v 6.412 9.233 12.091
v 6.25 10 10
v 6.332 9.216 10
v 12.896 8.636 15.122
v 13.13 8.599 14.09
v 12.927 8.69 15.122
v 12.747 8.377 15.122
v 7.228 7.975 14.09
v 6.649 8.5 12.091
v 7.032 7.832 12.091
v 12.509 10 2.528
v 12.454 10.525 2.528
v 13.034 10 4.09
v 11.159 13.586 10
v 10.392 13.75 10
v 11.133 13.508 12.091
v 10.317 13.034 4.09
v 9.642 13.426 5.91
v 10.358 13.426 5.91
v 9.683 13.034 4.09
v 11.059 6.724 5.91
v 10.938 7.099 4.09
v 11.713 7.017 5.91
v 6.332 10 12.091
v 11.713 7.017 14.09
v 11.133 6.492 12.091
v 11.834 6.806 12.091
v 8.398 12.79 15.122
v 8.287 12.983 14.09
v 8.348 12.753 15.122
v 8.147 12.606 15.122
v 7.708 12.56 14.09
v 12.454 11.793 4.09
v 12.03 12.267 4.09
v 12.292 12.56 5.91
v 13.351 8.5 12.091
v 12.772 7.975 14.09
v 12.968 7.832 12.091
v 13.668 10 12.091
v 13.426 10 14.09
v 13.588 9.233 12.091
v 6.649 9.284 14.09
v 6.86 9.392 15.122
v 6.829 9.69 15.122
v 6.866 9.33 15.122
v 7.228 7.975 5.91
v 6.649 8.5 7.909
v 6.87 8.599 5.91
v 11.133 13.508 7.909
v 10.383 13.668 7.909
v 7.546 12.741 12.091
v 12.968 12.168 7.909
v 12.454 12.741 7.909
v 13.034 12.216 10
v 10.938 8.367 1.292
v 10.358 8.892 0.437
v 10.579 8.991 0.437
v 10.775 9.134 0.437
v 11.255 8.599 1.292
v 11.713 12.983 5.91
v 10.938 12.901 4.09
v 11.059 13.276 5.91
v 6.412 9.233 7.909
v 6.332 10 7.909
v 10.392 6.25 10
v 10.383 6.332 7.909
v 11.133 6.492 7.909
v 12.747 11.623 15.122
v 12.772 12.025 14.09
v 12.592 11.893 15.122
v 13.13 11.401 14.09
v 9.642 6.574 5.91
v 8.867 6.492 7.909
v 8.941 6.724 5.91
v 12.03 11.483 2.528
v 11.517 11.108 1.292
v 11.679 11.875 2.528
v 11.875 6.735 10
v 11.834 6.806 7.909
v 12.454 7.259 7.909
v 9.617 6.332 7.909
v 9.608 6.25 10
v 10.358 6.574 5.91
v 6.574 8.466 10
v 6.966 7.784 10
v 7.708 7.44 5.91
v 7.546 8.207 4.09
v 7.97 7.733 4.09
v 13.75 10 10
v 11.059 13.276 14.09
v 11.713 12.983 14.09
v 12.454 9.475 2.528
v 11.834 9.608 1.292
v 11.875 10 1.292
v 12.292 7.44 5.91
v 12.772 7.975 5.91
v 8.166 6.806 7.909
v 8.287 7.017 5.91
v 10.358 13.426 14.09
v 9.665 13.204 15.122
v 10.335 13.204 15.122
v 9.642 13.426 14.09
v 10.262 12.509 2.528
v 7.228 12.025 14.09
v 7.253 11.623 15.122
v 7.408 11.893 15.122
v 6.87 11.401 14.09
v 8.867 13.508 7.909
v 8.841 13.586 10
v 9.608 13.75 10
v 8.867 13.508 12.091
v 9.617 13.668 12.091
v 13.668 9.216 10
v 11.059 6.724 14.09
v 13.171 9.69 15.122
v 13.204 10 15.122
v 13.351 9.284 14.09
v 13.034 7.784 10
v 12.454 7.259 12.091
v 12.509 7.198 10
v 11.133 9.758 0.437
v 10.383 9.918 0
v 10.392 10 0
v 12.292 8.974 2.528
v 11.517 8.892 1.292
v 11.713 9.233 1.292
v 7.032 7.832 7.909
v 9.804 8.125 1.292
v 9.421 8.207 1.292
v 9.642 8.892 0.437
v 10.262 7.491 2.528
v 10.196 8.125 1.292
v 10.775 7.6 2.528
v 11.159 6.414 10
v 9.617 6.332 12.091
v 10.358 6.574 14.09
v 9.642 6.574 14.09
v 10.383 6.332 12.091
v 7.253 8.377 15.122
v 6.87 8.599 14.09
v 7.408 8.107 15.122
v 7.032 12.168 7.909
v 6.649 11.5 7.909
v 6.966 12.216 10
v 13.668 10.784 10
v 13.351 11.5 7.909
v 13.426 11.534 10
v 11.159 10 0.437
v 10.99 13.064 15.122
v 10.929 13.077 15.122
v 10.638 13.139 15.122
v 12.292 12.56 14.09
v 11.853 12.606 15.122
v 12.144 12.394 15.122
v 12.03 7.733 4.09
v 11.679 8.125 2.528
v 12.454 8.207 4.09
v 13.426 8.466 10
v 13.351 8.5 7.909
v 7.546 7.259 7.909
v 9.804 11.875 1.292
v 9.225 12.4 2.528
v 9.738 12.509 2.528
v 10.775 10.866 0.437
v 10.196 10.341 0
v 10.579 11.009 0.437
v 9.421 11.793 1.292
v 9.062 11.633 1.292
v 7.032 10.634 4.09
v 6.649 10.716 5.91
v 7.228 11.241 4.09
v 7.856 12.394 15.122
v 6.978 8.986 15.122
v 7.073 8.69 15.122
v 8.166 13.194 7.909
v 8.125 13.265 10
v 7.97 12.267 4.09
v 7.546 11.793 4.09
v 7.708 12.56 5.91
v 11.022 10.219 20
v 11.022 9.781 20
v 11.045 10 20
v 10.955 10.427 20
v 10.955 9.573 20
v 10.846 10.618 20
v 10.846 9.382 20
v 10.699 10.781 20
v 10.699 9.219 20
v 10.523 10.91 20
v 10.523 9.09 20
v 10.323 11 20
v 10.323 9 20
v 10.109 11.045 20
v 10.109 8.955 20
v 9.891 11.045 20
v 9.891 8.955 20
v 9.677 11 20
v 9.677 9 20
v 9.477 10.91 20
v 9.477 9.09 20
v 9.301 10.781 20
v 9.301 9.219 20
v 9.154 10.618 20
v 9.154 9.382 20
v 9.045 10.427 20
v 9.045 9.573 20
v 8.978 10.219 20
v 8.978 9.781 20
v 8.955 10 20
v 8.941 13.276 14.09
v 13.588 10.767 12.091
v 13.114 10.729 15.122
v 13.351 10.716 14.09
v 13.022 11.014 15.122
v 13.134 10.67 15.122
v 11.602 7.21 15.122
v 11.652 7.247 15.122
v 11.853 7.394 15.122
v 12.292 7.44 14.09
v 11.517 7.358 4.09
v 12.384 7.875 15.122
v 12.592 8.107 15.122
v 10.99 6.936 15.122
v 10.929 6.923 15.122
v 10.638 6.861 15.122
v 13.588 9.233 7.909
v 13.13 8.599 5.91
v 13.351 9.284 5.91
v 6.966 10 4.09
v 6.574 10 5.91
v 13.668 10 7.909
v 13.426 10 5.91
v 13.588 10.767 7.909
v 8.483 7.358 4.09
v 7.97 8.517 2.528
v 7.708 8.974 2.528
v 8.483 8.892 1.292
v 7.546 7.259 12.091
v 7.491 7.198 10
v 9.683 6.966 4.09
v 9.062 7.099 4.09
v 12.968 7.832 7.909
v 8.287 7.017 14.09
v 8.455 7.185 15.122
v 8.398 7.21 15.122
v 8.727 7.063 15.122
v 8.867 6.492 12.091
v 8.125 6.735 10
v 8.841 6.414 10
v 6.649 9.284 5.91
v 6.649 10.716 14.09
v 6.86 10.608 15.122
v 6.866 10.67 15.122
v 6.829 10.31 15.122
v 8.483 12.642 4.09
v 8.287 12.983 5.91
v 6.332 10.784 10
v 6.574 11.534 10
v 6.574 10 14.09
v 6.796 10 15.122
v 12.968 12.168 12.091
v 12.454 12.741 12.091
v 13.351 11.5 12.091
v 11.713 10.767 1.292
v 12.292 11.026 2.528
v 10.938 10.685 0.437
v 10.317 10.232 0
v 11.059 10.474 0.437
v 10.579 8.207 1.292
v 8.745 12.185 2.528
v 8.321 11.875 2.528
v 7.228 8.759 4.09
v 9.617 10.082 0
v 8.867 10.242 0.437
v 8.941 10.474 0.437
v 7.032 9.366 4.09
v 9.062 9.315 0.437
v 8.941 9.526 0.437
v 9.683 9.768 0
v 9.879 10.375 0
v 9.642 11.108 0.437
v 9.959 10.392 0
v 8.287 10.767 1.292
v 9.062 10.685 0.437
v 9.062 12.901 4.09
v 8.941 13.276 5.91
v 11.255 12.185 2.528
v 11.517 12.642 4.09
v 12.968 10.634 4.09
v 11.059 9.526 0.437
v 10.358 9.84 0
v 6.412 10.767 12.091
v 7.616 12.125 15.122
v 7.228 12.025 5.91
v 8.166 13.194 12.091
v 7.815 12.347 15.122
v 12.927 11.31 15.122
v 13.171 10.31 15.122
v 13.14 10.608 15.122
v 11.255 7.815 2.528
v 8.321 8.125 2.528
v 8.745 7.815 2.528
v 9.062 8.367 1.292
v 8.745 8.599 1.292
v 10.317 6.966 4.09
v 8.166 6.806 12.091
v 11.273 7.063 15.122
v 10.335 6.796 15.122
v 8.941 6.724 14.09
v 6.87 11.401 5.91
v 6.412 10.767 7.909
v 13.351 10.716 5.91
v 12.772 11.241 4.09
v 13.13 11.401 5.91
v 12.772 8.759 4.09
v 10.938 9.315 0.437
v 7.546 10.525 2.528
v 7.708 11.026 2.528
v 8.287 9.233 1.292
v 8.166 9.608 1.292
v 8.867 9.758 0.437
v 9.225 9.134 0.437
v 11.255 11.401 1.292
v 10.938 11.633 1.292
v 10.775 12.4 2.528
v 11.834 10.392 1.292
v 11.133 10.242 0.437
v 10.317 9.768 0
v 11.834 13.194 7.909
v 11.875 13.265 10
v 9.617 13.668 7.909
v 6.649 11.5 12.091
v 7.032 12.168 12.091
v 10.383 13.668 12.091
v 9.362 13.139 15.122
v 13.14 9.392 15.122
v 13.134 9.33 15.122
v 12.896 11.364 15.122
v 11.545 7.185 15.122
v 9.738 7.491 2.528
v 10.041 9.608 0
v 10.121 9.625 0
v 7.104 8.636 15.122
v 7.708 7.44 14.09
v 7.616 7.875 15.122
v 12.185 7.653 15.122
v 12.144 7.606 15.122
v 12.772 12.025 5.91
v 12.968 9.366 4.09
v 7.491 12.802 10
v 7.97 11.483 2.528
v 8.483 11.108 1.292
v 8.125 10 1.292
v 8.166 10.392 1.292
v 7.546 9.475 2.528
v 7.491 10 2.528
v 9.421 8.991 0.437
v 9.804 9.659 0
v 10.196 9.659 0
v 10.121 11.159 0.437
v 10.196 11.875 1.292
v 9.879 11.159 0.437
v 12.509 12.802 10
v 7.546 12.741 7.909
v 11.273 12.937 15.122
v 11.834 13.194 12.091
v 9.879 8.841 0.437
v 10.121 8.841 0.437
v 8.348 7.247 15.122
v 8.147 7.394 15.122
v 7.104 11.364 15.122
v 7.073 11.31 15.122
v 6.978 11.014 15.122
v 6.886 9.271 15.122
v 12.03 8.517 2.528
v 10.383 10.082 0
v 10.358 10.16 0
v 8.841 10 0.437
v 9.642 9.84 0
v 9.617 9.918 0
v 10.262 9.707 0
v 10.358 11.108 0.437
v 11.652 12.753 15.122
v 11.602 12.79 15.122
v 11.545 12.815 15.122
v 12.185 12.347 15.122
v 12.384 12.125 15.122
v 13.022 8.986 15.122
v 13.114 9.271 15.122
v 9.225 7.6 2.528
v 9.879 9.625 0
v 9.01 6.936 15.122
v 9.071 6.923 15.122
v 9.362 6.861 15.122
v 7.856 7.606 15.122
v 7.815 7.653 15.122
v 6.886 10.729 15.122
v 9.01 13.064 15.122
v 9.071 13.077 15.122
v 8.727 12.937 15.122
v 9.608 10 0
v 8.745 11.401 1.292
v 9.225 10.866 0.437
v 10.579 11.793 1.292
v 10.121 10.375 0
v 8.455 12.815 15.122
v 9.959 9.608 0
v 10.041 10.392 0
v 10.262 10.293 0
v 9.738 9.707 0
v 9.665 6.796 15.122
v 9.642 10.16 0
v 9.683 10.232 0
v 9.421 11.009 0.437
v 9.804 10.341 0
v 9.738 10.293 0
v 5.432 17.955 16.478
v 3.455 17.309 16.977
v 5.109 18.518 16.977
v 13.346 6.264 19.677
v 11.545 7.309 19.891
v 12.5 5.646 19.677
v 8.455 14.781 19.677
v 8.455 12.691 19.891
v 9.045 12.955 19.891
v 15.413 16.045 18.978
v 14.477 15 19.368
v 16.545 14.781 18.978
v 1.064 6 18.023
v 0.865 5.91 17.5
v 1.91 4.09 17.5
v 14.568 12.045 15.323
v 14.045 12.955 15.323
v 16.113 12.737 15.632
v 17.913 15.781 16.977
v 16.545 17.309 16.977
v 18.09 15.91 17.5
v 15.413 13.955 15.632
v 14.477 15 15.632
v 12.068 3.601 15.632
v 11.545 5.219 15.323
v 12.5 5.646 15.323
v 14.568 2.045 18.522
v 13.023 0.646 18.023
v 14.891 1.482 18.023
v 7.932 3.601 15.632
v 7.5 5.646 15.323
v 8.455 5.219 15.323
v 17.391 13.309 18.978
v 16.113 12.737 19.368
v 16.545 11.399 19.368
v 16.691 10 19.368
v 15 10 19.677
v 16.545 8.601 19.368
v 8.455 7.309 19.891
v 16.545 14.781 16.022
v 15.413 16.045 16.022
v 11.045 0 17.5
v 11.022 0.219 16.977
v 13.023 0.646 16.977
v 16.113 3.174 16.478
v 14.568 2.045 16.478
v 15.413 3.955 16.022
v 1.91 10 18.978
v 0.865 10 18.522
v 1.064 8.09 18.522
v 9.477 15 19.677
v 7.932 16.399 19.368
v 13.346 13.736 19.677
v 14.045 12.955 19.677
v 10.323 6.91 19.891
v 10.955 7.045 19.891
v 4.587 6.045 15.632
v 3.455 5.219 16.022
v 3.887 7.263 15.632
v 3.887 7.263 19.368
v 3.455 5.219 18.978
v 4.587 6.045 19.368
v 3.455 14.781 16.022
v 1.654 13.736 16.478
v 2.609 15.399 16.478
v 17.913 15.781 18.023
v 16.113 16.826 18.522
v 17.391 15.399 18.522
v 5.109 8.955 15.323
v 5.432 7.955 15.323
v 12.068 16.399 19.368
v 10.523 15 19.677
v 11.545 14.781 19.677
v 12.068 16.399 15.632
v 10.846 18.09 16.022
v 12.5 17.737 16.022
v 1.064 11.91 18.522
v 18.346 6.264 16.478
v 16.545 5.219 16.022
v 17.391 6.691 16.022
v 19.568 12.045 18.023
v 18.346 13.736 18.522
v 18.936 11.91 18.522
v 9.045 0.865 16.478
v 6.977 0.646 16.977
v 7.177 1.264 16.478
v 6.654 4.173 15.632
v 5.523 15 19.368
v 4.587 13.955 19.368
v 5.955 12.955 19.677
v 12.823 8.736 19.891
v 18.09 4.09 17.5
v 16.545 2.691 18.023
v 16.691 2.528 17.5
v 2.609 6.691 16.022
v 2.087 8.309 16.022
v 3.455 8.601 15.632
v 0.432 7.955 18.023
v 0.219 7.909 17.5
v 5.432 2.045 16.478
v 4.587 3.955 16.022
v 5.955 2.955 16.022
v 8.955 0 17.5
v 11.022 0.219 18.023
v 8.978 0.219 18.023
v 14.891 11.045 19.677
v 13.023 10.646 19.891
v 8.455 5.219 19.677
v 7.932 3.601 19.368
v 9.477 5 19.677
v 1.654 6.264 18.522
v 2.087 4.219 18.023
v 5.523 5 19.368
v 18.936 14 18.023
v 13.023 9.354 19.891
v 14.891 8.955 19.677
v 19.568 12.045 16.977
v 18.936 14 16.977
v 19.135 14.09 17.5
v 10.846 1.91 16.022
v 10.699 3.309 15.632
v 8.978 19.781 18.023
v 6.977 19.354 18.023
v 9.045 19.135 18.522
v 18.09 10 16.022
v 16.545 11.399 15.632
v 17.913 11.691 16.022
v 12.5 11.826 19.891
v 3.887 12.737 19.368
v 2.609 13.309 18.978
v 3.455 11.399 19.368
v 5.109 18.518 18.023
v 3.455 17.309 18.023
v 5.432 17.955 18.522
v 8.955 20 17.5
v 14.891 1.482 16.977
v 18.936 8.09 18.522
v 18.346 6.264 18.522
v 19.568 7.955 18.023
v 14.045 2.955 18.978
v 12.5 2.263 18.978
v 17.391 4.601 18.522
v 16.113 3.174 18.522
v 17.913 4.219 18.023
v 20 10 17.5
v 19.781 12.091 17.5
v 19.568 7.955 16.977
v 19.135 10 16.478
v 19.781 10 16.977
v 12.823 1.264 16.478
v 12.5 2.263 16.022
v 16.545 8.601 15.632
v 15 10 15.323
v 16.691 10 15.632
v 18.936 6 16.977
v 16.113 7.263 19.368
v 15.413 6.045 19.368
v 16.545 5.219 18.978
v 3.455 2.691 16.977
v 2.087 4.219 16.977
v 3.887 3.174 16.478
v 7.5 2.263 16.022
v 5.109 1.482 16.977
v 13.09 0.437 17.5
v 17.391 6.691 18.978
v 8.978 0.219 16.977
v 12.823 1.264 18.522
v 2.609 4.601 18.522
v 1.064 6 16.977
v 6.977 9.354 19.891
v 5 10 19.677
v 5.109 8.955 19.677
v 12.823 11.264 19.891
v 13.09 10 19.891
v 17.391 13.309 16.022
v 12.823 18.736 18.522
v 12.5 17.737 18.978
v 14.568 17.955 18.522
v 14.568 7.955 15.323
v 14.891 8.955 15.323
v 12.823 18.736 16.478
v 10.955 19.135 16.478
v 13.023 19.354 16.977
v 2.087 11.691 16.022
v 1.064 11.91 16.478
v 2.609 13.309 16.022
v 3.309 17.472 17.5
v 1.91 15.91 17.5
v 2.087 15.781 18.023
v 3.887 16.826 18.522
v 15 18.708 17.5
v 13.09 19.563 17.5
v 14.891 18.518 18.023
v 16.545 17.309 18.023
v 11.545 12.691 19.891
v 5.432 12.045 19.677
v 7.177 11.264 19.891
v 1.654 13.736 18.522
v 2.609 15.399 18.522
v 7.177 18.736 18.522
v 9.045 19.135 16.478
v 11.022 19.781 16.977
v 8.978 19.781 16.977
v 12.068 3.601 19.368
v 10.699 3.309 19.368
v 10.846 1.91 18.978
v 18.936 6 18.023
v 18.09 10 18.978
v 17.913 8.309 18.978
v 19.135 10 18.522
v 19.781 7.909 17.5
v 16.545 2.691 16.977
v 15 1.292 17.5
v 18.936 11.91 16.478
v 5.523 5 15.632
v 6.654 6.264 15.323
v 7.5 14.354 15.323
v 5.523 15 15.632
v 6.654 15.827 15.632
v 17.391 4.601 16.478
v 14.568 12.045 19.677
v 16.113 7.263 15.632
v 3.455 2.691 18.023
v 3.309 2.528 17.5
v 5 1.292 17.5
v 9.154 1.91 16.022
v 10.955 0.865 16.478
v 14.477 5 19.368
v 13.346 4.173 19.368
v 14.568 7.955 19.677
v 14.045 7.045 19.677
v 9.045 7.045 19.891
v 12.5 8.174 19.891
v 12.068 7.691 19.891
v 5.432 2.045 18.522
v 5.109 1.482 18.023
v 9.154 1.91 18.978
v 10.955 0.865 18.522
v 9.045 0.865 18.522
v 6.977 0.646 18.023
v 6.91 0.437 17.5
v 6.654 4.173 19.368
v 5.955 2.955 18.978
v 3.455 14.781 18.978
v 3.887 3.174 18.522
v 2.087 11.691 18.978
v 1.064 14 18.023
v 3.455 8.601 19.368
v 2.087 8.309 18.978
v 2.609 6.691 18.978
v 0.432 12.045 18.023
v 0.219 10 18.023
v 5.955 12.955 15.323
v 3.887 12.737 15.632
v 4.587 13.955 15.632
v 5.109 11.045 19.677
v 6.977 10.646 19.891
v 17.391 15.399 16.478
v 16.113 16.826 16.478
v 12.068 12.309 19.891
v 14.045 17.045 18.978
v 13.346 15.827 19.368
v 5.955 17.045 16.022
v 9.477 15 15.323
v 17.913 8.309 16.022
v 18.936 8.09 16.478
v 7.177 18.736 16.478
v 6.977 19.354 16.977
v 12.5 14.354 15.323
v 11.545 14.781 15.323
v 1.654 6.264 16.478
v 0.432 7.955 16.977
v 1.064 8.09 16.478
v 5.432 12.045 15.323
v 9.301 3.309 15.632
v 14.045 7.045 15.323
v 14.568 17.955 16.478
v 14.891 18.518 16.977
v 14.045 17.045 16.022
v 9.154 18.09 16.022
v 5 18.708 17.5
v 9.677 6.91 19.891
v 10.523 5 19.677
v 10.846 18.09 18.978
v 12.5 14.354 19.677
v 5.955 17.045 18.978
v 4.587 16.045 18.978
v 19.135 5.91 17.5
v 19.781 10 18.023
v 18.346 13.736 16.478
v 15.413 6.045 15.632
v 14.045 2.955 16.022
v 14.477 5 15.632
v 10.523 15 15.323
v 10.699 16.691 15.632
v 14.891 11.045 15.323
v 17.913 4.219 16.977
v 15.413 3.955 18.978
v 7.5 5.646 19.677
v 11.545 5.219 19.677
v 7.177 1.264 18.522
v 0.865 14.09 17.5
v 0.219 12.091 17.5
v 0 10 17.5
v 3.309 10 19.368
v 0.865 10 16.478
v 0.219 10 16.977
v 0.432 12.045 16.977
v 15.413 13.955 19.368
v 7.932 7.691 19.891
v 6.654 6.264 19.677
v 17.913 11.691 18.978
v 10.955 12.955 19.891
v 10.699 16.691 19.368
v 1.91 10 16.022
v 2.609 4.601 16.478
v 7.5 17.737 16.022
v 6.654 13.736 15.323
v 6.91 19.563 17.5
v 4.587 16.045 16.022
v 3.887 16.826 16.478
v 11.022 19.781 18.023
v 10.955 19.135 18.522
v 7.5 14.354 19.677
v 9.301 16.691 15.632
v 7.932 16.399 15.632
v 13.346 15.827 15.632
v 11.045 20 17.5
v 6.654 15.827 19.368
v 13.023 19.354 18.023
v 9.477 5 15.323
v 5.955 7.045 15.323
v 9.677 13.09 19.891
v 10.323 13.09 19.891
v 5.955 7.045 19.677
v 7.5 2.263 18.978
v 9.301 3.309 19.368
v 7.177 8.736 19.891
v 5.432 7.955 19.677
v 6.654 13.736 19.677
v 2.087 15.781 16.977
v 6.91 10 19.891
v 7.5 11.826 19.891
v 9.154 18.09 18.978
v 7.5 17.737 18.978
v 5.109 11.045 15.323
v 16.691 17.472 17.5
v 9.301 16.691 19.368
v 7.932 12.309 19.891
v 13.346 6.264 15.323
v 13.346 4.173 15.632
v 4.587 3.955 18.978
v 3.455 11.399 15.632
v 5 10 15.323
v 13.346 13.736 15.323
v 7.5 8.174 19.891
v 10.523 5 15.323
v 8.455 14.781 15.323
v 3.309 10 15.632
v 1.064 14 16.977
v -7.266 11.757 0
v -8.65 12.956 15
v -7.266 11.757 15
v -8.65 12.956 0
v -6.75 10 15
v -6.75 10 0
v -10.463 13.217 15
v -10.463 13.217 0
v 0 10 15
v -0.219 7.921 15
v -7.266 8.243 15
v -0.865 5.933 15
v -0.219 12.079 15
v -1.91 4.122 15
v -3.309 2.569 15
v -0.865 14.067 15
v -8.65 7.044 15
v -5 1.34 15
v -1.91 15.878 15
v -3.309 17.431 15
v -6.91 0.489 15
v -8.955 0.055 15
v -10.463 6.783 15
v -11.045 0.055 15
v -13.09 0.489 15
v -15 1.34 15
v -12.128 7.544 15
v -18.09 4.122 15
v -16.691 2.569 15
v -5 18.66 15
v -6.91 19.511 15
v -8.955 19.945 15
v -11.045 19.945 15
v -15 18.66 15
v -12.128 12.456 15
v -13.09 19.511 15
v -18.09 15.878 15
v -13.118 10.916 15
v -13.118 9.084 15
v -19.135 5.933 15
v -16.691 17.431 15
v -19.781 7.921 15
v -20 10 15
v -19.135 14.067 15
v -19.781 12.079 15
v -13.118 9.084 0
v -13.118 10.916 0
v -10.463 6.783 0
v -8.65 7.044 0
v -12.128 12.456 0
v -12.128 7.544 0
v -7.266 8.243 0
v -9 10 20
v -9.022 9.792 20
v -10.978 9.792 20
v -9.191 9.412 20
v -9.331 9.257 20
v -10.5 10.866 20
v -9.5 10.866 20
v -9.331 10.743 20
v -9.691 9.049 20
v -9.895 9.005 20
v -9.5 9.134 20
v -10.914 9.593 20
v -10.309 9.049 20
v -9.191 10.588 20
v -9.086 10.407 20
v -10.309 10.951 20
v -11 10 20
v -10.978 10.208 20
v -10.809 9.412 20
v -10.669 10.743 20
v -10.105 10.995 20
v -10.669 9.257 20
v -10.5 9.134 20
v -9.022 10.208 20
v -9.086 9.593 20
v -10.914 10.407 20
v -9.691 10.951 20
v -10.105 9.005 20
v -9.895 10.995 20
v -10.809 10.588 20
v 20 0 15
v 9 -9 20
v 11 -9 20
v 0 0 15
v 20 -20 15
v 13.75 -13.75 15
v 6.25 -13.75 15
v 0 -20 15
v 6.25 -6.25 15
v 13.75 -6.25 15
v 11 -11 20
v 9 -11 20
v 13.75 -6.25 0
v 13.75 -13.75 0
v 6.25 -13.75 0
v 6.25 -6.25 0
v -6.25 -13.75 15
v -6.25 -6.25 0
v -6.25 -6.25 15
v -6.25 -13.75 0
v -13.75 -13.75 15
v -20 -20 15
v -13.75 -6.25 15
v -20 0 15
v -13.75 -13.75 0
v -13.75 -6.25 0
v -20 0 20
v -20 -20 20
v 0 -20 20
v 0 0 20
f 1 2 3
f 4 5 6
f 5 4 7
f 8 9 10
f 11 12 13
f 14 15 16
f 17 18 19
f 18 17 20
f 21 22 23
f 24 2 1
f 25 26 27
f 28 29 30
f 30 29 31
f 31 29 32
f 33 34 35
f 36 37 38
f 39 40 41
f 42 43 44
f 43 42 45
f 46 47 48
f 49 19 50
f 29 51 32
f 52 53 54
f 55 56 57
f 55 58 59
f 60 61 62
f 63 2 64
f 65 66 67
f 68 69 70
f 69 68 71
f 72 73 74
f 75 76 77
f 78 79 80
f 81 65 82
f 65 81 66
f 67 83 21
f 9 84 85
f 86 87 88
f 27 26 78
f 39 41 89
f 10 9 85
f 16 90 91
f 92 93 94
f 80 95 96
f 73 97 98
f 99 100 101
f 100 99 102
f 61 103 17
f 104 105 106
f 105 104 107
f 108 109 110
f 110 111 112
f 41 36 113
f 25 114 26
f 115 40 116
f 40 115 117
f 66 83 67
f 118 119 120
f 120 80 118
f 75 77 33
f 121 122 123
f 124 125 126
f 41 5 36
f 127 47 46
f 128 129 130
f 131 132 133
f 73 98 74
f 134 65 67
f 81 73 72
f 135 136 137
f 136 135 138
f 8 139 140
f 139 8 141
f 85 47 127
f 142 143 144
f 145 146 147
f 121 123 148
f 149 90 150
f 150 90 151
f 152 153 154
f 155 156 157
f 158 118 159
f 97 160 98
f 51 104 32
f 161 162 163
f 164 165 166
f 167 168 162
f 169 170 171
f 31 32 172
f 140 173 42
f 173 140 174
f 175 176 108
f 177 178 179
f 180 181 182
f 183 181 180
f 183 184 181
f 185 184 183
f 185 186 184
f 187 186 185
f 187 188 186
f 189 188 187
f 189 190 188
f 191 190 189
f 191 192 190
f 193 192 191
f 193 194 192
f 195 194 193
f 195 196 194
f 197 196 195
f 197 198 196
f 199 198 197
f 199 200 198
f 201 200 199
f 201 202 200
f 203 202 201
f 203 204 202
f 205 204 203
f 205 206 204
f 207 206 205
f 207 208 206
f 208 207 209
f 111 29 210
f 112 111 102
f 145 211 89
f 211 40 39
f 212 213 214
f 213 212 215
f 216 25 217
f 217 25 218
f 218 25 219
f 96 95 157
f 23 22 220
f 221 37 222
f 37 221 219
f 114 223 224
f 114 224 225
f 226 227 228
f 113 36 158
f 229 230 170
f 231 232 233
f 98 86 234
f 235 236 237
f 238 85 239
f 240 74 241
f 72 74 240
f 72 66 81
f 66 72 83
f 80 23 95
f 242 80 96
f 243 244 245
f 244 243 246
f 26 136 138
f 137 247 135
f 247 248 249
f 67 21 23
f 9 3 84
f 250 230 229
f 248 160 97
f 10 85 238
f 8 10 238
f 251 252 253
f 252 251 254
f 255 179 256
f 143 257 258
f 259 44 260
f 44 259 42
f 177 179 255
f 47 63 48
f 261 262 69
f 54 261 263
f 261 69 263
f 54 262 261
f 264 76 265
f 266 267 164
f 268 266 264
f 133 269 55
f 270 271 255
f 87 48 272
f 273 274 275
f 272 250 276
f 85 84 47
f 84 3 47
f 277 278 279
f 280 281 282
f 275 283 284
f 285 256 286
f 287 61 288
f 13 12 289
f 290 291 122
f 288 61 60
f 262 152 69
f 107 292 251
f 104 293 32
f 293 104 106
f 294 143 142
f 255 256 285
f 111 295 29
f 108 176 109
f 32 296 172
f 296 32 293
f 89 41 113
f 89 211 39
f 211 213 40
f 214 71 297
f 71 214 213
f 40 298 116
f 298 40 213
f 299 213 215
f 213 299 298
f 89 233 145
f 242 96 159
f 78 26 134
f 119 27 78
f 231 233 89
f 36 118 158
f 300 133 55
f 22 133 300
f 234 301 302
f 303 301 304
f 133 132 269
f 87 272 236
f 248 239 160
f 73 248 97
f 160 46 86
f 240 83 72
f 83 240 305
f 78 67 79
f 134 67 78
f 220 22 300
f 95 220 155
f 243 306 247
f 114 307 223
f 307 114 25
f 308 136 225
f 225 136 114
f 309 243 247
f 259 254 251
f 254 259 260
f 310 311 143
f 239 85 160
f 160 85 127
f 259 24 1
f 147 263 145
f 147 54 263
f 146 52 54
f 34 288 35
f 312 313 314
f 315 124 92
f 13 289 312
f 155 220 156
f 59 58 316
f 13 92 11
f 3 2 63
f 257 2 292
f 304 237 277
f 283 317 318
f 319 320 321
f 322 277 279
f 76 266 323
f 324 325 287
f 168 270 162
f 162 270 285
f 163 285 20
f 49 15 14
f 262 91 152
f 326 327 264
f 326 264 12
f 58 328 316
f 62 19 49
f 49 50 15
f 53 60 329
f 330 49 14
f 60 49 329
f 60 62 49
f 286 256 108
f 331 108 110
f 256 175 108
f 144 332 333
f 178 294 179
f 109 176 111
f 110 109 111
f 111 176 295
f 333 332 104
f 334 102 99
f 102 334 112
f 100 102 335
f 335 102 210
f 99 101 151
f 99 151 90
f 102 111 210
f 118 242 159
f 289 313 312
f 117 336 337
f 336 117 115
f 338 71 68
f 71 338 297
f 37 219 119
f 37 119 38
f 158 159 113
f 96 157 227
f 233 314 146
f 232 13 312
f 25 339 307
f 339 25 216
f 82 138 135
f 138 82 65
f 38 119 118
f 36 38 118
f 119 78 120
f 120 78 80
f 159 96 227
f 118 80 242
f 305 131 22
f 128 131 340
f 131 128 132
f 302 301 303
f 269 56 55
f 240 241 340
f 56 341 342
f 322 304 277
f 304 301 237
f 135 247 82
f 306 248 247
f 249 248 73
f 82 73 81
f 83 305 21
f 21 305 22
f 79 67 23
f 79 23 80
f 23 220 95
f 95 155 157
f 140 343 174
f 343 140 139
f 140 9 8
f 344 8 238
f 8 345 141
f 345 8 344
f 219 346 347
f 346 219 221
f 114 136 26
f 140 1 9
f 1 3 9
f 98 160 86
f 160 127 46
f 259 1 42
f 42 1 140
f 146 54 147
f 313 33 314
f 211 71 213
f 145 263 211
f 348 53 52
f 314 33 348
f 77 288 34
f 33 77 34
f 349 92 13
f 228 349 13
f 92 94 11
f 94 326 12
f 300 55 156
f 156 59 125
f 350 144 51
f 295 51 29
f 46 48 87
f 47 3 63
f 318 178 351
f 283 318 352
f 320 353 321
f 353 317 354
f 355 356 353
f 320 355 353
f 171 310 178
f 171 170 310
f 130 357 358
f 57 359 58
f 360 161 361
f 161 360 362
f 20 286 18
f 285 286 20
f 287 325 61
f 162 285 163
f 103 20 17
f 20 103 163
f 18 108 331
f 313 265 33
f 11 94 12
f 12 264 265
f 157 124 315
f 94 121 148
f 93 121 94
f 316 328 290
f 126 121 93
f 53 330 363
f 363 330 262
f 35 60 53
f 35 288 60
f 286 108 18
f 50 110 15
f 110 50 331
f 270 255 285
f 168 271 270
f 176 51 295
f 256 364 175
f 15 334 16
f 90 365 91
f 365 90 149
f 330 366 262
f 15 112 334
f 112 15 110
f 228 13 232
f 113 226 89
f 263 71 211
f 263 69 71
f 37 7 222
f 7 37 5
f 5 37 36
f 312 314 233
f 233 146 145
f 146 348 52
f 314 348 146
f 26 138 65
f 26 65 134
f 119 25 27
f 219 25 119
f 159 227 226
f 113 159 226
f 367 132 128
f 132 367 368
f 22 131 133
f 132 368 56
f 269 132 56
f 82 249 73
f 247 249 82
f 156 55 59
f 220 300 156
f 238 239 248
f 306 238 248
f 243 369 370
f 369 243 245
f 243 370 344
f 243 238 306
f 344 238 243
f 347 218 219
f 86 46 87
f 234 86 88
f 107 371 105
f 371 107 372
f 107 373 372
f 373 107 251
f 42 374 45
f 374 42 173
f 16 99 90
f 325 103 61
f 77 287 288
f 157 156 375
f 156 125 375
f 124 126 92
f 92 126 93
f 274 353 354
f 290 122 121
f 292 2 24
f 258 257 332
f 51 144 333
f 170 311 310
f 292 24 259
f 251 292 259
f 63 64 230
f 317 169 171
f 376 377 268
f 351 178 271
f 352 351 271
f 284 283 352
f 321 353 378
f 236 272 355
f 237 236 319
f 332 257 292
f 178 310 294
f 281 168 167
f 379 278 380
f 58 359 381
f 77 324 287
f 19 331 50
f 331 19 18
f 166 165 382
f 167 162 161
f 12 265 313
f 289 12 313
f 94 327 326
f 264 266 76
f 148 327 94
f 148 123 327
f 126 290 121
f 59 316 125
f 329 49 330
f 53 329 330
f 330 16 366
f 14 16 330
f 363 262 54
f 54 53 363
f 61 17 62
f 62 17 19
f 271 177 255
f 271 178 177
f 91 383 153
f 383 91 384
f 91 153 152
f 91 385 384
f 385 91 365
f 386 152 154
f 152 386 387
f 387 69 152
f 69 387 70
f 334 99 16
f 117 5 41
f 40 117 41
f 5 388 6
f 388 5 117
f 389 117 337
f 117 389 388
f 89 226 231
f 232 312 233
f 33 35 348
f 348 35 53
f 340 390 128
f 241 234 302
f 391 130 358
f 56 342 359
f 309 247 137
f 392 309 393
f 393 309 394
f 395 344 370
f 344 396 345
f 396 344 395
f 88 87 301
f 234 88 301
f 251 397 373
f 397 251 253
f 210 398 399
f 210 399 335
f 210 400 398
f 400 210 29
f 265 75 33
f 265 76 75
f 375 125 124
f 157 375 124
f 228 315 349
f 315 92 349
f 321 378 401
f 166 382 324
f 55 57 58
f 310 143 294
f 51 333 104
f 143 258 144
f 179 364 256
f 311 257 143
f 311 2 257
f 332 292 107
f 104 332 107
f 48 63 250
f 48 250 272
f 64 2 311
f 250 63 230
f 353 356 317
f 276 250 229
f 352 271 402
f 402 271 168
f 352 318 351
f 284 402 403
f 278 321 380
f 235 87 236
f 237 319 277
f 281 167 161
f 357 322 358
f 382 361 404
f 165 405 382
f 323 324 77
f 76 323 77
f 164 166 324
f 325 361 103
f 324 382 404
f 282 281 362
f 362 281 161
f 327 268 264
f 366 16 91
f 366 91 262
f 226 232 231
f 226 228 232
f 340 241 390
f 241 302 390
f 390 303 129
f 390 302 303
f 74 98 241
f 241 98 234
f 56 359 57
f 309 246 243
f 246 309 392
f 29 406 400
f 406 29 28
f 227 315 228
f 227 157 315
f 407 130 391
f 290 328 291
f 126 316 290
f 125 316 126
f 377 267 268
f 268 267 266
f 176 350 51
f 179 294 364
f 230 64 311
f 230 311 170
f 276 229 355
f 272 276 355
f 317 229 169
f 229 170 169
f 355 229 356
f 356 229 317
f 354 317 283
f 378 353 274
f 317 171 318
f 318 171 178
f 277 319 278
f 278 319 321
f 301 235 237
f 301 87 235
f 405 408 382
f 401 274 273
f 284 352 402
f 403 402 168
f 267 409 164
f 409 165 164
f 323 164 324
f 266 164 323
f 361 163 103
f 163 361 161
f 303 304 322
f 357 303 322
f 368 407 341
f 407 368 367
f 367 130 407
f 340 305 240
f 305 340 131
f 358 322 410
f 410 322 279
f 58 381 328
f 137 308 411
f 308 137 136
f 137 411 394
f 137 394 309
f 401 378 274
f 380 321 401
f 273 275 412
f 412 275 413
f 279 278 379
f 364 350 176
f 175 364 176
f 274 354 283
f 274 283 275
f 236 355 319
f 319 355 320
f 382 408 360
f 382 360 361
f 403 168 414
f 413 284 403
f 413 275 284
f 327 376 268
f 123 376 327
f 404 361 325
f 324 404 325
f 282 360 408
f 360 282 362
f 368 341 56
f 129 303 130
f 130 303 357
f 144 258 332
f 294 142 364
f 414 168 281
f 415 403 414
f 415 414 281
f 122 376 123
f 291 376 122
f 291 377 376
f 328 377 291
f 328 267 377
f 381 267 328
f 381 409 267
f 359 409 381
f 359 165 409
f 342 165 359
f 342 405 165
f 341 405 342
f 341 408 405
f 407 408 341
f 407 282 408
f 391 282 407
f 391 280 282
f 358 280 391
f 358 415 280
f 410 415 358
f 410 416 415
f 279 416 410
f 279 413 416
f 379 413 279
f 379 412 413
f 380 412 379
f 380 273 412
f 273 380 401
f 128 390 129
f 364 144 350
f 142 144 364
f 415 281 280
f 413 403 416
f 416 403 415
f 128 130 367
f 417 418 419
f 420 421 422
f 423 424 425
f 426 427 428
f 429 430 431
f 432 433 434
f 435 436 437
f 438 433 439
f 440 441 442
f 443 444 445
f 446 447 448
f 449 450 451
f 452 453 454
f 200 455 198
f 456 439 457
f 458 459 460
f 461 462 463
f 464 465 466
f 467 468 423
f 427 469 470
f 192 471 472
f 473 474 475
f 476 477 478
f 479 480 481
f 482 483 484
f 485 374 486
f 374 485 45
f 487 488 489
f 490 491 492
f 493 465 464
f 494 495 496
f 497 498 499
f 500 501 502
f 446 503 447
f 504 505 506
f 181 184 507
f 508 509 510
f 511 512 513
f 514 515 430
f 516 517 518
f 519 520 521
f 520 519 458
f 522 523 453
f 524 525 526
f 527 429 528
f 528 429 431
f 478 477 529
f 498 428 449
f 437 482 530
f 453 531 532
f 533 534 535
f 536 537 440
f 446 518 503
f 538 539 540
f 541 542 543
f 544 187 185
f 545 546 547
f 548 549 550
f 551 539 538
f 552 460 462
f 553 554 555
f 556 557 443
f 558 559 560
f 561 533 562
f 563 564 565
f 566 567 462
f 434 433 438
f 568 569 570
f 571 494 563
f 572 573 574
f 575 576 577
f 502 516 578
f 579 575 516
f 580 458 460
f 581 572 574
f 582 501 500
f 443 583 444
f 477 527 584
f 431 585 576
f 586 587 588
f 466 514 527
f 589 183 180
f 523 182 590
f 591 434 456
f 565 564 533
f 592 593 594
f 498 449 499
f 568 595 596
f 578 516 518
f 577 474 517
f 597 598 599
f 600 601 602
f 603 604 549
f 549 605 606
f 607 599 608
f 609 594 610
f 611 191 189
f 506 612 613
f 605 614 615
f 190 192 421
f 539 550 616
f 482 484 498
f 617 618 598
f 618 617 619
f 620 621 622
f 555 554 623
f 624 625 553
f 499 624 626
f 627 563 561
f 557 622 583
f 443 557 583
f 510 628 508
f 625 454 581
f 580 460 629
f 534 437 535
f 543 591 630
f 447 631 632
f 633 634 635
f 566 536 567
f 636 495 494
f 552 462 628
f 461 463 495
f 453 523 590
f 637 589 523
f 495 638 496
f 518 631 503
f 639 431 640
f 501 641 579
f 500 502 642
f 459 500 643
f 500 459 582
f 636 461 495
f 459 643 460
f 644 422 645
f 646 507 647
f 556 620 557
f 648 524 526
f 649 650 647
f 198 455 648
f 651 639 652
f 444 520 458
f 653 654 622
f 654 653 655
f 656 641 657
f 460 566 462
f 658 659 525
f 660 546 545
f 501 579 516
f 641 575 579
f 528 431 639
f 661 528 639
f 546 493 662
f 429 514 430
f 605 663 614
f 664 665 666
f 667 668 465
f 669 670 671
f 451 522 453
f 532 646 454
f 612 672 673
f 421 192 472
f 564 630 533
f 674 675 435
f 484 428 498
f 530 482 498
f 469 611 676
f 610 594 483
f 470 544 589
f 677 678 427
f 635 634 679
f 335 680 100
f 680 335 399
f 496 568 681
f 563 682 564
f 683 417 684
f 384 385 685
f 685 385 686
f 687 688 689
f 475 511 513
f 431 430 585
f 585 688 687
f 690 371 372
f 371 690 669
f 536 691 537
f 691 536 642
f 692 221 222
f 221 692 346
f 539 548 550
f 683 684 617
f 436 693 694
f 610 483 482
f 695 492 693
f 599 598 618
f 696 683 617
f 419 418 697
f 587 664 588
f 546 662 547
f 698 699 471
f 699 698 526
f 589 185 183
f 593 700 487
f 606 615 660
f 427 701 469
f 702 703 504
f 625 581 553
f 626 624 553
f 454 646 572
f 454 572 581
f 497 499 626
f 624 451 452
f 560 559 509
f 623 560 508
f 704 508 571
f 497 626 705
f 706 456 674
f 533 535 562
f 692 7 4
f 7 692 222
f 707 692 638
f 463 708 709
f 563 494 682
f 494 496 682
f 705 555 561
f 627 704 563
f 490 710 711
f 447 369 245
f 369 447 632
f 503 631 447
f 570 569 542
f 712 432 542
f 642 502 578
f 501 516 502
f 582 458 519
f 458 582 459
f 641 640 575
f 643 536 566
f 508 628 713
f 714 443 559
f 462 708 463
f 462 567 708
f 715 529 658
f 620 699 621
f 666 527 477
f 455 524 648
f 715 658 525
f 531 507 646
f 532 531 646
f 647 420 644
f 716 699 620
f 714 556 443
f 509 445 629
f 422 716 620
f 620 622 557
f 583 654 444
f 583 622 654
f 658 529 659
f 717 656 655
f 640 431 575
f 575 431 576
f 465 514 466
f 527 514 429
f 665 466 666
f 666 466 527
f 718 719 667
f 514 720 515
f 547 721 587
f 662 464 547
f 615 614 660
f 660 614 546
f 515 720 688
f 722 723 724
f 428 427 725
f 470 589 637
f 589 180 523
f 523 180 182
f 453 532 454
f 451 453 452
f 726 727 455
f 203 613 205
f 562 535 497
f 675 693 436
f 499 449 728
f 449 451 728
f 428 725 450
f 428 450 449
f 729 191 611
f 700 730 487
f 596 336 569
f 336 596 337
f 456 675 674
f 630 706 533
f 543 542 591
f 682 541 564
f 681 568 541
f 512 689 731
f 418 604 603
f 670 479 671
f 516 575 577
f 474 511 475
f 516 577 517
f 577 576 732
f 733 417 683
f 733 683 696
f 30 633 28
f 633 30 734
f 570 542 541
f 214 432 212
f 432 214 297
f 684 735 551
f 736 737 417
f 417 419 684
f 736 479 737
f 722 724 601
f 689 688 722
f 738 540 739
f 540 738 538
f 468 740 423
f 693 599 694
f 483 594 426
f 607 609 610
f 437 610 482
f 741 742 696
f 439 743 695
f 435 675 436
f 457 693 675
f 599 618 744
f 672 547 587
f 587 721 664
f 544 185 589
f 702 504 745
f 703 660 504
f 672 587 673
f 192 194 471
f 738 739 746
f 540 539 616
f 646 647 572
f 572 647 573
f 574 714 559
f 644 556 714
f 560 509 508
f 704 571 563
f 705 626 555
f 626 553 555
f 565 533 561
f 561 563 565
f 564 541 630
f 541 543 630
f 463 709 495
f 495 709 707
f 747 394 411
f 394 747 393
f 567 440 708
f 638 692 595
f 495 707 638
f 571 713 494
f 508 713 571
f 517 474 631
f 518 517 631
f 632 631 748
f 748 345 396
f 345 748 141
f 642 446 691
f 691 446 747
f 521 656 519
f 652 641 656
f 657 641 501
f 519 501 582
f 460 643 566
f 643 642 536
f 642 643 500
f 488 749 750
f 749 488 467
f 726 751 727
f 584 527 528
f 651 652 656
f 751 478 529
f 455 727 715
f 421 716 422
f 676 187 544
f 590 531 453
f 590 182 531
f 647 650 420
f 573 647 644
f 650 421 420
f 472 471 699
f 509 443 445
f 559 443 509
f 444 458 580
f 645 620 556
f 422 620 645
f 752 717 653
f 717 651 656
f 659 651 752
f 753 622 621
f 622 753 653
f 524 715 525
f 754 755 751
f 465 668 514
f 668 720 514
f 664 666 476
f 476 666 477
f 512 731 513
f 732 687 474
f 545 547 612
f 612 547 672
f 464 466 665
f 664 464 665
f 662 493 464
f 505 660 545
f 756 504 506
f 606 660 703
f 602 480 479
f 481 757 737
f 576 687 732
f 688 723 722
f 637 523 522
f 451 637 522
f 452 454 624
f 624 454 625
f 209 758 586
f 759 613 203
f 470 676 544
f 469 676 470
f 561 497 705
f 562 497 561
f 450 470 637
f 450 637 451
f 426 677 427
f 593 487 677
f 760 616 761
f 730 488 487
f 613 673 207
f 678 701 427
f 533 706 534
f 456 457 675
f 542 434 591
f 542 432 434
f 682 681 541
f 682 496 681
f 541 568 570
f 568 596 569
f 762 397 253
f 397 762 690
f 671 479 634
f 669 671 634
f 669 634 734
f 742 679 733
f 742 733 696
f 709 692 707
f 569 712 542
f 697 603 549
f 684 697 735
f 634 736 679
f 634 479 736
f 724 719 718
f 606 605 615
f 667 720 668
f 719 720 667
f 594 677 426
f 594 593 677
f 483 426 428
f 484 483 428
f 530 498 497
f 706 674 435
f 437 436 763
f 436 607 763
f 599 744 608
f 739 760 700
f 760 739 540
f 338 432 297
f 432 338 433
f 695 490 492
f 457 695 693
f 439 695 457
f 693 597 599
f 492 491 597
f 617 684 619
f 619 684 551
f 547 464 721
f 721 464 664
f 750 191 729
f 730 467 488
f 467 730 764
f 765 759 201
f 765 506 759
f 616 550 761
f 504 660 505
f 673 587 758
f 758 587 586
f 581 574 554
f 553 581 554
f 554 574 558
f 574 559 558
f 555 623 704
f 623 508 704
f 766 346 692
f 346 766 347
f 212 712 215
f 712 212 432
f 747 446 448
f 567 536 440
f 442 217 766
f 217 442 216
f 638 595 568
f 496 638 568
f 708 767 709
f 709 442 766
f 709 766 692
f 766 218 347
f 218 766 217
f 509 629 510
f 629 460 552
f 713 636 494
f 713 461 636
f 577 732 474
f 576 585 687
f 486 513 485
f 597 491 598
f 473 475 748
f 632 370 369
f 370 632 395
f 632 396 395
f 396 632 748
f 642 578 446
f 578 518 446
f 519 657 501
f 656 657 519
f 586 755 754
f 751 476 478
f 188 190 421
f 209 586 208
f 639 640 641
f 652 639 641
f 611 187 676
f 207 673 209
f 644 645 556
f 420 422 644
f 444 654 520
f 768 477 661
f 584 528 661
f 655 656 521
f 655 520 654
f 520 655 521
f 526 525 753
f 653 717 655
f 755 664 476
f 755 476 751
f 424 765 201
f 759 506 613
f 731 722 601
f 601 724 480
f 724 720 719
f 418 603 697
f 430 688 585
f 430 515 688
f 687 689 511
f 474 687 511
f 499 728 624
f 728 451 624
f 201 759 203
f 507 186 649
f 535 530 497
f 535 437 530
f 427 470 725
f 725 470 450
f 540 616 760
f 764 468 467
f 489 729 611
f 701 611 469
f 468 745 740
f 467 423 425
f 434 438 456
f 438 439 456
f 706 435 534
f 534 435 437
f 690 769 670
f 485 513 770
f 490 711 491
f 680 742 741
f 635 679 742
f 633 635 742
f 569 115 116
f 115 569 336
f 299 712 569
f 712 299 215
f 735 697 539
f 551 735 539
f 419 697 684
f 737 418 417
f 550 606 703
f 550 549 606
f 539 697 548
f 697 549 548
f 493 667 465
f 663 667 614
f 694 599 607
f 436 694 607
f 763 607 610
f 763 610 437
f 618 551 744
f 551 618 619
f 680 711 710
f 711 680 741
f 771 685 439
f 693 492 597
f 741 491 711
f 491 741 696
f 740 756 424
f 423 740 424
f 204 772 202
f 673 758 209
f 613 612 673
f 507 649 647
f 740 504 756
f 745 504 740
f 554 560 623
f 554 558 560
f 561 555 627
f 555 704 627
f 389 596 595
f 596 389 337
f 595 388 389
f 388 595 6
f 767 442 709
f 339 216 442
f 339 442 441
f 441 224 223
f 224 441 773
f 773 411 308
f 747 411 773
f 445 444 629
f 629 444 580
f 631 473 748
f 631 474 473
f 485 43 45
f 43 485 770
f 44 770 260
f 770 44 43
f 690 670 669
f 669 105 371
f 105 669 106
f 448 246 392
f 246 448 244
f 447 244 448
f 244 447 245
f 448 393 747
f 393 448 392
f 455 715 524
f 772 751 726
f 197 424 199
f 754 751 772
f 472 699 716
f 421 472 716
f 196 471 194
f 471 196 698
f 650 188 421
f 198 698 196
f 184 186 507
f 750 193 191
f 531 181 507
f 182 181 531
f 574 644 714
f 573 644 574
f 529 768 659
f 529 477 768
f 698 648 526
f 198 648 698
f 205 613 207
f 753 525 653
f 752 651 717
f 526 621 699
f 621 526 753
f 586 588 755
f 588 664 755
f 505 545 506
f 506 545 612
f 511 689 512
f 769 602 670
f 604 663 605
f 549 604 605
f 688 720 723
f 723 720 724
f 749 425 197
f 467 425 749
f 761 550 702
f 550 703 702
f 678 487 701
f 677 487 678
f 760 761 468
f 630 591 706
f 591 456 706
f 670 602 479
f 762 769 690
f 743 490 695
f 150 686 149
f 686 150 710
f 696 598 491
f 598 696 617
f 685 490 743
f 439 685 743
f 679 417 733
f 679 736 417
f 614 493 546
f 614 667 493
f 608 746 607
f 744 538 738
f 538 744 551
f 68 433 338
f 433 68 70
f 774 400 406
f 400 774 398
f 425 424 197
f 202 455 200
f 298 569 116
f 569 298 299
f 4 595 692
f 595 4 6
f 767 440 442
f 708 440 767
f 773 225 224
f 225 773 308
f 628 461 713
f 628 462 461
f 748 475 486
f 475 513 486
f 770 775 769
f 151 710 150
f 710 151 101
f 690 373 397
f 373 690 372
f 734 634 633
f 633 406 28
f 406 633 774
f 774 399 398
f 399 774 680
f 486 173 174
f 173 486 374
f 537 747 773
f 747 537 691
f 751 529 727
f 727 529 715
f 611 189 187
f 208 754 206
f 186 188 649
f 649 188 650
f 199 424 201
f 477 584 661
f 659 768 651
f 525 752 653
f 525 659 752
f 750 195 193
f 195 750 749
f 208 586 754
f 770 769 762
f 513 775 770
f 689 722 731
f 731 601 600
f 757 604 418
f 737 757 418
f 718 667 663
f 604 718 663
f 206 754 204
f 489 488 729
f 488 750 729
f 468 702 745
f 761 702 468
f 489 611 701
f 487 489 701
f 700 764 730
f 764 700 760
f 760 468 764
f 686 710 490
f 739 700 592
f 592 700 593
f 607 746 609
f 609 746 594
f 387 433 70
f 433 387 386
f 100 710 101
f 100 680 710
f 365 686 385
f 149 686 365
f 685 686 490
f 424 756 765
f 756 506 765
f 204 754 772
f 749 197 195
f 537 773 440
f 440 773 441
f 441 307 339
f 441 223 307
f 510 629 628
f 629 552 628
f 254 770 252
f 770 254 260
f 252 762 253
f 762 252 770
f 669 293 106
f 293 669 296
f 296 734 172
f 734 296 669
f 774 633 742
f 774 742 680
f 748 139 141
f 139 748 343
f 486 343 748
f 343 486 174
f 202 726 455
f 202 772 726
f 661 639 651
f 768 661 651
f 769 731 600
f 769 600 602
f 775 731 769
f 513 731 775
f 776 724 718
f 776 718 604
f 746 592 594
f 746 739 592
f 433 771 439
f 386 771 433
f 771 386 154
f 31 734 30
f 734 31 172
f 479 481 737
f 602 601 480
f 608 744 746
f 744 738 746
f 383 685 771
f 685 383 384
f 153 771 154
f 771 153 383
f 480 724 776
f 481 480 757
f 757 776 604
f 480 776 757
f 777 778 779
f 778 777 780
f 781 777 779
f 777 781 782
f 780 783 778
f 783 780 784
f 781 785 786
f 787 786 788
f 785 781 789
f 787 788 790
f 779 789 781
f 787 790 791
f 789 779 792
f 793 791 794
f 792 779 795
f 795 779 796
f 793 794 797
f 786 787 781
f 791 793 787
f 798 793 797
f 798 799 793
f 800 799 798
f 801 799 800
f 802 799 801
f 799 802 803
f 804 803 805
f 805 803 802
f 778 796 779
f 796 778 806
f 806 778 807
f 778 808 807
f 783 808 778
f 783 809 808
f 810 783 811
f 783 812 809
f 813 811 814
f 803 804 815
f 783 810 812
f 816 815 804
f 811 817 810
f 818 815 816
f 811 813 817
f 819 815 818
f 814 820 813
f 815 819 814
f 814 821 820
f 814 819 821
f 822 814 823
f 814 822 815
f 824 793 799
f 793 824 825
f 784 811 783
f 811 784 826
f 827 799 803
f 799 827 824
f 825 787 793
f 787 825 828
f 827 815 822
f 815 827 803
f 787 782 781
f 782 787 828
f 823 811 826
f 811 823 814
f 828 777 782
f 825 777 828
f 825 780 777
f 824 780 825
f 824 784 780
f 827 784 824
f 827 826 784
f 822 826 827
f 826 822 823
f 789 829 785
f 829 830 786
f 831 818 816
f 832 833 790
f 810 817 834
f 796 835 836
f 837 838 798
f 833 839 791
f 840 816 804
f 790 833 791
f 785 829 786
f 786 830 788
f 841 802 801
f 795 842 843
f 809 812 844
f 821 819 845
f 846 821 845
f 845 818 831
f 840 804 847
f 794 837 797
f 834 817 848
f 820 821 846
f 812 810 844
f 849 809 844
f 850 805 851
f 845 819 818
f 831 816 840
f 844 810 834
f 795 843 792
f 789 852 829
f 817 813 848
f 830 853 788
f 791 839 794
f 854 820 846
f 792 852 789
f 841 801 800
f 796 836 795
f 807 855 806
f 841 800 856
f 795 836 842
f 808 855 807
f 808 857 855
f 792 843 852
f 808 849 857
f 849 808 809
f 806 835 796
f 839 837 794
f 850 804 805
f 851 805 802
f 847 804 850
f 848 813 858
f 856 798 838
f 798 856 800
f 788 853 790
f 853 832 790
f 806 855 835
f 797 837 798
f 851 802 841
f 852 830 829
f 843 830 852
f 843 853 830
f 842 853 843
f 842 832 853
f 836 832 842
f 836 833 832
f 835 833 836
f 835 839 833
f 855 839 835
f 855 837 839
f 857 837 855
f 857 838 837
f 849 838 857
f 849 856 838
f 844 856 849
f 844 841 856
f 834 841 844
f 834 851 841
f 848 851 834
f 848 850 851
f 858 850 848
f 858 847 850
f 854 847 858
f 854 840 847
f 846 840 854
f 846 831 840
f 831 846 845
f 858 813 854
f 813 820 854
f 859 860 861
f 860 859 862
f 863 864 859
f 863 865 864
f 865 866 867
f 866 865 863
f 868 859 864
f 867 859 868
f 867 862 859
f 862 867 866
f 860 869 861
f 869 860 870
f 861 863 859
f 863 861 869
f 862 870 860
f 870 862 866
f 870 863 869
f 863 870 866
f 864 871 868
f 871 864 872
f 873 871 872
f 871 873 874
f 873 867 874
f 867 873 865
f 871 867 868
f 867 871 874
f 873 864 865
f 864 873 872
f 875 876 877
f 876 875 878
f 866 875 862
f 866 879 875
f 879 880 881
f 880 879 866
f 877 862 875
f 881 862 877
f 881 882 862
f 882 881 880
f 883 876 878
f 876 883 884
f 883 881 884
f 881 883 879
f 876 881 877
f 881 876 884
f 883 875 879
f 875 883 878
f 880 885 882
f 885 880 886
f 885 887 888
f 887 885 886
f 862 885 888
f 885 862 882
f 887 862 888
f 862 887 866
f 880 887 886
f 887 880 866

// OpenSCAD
// Some pleasing mushroom shapes
// copyright SJ Hindmarch 2015

// A mushroom of distorted spheres
translate([10,10,10]){
	resize([7.5,7.5,20])sphere(10);
	translate([0,0,7.5])resize([20,20,5])sphere(10);
}

// A circular mushroom
translate([-10,10,0]){
	cylinder(r=3.25,h=15);
	translate([0,0,15])cylinder(r1=10,r2=1,h=5);
}

// A pointed, square mushroom
translate([6.25,-13.75,0]){
	cube([7.5,7.5,15]);
}
translate([10,-10,15]){
	for(r=[0:3]){
		rotate(r*90)linear_extrude(height=5,scale=0.1,centre=true){square([10,10]);}
	}
}

// A flat, square mushroom
translate([-13.75,-13.75,0]){
	cube([7.5,7.5,15]);
}
translate([-20,-20,15])linear_extrude(height=5){
	square([20,20]);
}
